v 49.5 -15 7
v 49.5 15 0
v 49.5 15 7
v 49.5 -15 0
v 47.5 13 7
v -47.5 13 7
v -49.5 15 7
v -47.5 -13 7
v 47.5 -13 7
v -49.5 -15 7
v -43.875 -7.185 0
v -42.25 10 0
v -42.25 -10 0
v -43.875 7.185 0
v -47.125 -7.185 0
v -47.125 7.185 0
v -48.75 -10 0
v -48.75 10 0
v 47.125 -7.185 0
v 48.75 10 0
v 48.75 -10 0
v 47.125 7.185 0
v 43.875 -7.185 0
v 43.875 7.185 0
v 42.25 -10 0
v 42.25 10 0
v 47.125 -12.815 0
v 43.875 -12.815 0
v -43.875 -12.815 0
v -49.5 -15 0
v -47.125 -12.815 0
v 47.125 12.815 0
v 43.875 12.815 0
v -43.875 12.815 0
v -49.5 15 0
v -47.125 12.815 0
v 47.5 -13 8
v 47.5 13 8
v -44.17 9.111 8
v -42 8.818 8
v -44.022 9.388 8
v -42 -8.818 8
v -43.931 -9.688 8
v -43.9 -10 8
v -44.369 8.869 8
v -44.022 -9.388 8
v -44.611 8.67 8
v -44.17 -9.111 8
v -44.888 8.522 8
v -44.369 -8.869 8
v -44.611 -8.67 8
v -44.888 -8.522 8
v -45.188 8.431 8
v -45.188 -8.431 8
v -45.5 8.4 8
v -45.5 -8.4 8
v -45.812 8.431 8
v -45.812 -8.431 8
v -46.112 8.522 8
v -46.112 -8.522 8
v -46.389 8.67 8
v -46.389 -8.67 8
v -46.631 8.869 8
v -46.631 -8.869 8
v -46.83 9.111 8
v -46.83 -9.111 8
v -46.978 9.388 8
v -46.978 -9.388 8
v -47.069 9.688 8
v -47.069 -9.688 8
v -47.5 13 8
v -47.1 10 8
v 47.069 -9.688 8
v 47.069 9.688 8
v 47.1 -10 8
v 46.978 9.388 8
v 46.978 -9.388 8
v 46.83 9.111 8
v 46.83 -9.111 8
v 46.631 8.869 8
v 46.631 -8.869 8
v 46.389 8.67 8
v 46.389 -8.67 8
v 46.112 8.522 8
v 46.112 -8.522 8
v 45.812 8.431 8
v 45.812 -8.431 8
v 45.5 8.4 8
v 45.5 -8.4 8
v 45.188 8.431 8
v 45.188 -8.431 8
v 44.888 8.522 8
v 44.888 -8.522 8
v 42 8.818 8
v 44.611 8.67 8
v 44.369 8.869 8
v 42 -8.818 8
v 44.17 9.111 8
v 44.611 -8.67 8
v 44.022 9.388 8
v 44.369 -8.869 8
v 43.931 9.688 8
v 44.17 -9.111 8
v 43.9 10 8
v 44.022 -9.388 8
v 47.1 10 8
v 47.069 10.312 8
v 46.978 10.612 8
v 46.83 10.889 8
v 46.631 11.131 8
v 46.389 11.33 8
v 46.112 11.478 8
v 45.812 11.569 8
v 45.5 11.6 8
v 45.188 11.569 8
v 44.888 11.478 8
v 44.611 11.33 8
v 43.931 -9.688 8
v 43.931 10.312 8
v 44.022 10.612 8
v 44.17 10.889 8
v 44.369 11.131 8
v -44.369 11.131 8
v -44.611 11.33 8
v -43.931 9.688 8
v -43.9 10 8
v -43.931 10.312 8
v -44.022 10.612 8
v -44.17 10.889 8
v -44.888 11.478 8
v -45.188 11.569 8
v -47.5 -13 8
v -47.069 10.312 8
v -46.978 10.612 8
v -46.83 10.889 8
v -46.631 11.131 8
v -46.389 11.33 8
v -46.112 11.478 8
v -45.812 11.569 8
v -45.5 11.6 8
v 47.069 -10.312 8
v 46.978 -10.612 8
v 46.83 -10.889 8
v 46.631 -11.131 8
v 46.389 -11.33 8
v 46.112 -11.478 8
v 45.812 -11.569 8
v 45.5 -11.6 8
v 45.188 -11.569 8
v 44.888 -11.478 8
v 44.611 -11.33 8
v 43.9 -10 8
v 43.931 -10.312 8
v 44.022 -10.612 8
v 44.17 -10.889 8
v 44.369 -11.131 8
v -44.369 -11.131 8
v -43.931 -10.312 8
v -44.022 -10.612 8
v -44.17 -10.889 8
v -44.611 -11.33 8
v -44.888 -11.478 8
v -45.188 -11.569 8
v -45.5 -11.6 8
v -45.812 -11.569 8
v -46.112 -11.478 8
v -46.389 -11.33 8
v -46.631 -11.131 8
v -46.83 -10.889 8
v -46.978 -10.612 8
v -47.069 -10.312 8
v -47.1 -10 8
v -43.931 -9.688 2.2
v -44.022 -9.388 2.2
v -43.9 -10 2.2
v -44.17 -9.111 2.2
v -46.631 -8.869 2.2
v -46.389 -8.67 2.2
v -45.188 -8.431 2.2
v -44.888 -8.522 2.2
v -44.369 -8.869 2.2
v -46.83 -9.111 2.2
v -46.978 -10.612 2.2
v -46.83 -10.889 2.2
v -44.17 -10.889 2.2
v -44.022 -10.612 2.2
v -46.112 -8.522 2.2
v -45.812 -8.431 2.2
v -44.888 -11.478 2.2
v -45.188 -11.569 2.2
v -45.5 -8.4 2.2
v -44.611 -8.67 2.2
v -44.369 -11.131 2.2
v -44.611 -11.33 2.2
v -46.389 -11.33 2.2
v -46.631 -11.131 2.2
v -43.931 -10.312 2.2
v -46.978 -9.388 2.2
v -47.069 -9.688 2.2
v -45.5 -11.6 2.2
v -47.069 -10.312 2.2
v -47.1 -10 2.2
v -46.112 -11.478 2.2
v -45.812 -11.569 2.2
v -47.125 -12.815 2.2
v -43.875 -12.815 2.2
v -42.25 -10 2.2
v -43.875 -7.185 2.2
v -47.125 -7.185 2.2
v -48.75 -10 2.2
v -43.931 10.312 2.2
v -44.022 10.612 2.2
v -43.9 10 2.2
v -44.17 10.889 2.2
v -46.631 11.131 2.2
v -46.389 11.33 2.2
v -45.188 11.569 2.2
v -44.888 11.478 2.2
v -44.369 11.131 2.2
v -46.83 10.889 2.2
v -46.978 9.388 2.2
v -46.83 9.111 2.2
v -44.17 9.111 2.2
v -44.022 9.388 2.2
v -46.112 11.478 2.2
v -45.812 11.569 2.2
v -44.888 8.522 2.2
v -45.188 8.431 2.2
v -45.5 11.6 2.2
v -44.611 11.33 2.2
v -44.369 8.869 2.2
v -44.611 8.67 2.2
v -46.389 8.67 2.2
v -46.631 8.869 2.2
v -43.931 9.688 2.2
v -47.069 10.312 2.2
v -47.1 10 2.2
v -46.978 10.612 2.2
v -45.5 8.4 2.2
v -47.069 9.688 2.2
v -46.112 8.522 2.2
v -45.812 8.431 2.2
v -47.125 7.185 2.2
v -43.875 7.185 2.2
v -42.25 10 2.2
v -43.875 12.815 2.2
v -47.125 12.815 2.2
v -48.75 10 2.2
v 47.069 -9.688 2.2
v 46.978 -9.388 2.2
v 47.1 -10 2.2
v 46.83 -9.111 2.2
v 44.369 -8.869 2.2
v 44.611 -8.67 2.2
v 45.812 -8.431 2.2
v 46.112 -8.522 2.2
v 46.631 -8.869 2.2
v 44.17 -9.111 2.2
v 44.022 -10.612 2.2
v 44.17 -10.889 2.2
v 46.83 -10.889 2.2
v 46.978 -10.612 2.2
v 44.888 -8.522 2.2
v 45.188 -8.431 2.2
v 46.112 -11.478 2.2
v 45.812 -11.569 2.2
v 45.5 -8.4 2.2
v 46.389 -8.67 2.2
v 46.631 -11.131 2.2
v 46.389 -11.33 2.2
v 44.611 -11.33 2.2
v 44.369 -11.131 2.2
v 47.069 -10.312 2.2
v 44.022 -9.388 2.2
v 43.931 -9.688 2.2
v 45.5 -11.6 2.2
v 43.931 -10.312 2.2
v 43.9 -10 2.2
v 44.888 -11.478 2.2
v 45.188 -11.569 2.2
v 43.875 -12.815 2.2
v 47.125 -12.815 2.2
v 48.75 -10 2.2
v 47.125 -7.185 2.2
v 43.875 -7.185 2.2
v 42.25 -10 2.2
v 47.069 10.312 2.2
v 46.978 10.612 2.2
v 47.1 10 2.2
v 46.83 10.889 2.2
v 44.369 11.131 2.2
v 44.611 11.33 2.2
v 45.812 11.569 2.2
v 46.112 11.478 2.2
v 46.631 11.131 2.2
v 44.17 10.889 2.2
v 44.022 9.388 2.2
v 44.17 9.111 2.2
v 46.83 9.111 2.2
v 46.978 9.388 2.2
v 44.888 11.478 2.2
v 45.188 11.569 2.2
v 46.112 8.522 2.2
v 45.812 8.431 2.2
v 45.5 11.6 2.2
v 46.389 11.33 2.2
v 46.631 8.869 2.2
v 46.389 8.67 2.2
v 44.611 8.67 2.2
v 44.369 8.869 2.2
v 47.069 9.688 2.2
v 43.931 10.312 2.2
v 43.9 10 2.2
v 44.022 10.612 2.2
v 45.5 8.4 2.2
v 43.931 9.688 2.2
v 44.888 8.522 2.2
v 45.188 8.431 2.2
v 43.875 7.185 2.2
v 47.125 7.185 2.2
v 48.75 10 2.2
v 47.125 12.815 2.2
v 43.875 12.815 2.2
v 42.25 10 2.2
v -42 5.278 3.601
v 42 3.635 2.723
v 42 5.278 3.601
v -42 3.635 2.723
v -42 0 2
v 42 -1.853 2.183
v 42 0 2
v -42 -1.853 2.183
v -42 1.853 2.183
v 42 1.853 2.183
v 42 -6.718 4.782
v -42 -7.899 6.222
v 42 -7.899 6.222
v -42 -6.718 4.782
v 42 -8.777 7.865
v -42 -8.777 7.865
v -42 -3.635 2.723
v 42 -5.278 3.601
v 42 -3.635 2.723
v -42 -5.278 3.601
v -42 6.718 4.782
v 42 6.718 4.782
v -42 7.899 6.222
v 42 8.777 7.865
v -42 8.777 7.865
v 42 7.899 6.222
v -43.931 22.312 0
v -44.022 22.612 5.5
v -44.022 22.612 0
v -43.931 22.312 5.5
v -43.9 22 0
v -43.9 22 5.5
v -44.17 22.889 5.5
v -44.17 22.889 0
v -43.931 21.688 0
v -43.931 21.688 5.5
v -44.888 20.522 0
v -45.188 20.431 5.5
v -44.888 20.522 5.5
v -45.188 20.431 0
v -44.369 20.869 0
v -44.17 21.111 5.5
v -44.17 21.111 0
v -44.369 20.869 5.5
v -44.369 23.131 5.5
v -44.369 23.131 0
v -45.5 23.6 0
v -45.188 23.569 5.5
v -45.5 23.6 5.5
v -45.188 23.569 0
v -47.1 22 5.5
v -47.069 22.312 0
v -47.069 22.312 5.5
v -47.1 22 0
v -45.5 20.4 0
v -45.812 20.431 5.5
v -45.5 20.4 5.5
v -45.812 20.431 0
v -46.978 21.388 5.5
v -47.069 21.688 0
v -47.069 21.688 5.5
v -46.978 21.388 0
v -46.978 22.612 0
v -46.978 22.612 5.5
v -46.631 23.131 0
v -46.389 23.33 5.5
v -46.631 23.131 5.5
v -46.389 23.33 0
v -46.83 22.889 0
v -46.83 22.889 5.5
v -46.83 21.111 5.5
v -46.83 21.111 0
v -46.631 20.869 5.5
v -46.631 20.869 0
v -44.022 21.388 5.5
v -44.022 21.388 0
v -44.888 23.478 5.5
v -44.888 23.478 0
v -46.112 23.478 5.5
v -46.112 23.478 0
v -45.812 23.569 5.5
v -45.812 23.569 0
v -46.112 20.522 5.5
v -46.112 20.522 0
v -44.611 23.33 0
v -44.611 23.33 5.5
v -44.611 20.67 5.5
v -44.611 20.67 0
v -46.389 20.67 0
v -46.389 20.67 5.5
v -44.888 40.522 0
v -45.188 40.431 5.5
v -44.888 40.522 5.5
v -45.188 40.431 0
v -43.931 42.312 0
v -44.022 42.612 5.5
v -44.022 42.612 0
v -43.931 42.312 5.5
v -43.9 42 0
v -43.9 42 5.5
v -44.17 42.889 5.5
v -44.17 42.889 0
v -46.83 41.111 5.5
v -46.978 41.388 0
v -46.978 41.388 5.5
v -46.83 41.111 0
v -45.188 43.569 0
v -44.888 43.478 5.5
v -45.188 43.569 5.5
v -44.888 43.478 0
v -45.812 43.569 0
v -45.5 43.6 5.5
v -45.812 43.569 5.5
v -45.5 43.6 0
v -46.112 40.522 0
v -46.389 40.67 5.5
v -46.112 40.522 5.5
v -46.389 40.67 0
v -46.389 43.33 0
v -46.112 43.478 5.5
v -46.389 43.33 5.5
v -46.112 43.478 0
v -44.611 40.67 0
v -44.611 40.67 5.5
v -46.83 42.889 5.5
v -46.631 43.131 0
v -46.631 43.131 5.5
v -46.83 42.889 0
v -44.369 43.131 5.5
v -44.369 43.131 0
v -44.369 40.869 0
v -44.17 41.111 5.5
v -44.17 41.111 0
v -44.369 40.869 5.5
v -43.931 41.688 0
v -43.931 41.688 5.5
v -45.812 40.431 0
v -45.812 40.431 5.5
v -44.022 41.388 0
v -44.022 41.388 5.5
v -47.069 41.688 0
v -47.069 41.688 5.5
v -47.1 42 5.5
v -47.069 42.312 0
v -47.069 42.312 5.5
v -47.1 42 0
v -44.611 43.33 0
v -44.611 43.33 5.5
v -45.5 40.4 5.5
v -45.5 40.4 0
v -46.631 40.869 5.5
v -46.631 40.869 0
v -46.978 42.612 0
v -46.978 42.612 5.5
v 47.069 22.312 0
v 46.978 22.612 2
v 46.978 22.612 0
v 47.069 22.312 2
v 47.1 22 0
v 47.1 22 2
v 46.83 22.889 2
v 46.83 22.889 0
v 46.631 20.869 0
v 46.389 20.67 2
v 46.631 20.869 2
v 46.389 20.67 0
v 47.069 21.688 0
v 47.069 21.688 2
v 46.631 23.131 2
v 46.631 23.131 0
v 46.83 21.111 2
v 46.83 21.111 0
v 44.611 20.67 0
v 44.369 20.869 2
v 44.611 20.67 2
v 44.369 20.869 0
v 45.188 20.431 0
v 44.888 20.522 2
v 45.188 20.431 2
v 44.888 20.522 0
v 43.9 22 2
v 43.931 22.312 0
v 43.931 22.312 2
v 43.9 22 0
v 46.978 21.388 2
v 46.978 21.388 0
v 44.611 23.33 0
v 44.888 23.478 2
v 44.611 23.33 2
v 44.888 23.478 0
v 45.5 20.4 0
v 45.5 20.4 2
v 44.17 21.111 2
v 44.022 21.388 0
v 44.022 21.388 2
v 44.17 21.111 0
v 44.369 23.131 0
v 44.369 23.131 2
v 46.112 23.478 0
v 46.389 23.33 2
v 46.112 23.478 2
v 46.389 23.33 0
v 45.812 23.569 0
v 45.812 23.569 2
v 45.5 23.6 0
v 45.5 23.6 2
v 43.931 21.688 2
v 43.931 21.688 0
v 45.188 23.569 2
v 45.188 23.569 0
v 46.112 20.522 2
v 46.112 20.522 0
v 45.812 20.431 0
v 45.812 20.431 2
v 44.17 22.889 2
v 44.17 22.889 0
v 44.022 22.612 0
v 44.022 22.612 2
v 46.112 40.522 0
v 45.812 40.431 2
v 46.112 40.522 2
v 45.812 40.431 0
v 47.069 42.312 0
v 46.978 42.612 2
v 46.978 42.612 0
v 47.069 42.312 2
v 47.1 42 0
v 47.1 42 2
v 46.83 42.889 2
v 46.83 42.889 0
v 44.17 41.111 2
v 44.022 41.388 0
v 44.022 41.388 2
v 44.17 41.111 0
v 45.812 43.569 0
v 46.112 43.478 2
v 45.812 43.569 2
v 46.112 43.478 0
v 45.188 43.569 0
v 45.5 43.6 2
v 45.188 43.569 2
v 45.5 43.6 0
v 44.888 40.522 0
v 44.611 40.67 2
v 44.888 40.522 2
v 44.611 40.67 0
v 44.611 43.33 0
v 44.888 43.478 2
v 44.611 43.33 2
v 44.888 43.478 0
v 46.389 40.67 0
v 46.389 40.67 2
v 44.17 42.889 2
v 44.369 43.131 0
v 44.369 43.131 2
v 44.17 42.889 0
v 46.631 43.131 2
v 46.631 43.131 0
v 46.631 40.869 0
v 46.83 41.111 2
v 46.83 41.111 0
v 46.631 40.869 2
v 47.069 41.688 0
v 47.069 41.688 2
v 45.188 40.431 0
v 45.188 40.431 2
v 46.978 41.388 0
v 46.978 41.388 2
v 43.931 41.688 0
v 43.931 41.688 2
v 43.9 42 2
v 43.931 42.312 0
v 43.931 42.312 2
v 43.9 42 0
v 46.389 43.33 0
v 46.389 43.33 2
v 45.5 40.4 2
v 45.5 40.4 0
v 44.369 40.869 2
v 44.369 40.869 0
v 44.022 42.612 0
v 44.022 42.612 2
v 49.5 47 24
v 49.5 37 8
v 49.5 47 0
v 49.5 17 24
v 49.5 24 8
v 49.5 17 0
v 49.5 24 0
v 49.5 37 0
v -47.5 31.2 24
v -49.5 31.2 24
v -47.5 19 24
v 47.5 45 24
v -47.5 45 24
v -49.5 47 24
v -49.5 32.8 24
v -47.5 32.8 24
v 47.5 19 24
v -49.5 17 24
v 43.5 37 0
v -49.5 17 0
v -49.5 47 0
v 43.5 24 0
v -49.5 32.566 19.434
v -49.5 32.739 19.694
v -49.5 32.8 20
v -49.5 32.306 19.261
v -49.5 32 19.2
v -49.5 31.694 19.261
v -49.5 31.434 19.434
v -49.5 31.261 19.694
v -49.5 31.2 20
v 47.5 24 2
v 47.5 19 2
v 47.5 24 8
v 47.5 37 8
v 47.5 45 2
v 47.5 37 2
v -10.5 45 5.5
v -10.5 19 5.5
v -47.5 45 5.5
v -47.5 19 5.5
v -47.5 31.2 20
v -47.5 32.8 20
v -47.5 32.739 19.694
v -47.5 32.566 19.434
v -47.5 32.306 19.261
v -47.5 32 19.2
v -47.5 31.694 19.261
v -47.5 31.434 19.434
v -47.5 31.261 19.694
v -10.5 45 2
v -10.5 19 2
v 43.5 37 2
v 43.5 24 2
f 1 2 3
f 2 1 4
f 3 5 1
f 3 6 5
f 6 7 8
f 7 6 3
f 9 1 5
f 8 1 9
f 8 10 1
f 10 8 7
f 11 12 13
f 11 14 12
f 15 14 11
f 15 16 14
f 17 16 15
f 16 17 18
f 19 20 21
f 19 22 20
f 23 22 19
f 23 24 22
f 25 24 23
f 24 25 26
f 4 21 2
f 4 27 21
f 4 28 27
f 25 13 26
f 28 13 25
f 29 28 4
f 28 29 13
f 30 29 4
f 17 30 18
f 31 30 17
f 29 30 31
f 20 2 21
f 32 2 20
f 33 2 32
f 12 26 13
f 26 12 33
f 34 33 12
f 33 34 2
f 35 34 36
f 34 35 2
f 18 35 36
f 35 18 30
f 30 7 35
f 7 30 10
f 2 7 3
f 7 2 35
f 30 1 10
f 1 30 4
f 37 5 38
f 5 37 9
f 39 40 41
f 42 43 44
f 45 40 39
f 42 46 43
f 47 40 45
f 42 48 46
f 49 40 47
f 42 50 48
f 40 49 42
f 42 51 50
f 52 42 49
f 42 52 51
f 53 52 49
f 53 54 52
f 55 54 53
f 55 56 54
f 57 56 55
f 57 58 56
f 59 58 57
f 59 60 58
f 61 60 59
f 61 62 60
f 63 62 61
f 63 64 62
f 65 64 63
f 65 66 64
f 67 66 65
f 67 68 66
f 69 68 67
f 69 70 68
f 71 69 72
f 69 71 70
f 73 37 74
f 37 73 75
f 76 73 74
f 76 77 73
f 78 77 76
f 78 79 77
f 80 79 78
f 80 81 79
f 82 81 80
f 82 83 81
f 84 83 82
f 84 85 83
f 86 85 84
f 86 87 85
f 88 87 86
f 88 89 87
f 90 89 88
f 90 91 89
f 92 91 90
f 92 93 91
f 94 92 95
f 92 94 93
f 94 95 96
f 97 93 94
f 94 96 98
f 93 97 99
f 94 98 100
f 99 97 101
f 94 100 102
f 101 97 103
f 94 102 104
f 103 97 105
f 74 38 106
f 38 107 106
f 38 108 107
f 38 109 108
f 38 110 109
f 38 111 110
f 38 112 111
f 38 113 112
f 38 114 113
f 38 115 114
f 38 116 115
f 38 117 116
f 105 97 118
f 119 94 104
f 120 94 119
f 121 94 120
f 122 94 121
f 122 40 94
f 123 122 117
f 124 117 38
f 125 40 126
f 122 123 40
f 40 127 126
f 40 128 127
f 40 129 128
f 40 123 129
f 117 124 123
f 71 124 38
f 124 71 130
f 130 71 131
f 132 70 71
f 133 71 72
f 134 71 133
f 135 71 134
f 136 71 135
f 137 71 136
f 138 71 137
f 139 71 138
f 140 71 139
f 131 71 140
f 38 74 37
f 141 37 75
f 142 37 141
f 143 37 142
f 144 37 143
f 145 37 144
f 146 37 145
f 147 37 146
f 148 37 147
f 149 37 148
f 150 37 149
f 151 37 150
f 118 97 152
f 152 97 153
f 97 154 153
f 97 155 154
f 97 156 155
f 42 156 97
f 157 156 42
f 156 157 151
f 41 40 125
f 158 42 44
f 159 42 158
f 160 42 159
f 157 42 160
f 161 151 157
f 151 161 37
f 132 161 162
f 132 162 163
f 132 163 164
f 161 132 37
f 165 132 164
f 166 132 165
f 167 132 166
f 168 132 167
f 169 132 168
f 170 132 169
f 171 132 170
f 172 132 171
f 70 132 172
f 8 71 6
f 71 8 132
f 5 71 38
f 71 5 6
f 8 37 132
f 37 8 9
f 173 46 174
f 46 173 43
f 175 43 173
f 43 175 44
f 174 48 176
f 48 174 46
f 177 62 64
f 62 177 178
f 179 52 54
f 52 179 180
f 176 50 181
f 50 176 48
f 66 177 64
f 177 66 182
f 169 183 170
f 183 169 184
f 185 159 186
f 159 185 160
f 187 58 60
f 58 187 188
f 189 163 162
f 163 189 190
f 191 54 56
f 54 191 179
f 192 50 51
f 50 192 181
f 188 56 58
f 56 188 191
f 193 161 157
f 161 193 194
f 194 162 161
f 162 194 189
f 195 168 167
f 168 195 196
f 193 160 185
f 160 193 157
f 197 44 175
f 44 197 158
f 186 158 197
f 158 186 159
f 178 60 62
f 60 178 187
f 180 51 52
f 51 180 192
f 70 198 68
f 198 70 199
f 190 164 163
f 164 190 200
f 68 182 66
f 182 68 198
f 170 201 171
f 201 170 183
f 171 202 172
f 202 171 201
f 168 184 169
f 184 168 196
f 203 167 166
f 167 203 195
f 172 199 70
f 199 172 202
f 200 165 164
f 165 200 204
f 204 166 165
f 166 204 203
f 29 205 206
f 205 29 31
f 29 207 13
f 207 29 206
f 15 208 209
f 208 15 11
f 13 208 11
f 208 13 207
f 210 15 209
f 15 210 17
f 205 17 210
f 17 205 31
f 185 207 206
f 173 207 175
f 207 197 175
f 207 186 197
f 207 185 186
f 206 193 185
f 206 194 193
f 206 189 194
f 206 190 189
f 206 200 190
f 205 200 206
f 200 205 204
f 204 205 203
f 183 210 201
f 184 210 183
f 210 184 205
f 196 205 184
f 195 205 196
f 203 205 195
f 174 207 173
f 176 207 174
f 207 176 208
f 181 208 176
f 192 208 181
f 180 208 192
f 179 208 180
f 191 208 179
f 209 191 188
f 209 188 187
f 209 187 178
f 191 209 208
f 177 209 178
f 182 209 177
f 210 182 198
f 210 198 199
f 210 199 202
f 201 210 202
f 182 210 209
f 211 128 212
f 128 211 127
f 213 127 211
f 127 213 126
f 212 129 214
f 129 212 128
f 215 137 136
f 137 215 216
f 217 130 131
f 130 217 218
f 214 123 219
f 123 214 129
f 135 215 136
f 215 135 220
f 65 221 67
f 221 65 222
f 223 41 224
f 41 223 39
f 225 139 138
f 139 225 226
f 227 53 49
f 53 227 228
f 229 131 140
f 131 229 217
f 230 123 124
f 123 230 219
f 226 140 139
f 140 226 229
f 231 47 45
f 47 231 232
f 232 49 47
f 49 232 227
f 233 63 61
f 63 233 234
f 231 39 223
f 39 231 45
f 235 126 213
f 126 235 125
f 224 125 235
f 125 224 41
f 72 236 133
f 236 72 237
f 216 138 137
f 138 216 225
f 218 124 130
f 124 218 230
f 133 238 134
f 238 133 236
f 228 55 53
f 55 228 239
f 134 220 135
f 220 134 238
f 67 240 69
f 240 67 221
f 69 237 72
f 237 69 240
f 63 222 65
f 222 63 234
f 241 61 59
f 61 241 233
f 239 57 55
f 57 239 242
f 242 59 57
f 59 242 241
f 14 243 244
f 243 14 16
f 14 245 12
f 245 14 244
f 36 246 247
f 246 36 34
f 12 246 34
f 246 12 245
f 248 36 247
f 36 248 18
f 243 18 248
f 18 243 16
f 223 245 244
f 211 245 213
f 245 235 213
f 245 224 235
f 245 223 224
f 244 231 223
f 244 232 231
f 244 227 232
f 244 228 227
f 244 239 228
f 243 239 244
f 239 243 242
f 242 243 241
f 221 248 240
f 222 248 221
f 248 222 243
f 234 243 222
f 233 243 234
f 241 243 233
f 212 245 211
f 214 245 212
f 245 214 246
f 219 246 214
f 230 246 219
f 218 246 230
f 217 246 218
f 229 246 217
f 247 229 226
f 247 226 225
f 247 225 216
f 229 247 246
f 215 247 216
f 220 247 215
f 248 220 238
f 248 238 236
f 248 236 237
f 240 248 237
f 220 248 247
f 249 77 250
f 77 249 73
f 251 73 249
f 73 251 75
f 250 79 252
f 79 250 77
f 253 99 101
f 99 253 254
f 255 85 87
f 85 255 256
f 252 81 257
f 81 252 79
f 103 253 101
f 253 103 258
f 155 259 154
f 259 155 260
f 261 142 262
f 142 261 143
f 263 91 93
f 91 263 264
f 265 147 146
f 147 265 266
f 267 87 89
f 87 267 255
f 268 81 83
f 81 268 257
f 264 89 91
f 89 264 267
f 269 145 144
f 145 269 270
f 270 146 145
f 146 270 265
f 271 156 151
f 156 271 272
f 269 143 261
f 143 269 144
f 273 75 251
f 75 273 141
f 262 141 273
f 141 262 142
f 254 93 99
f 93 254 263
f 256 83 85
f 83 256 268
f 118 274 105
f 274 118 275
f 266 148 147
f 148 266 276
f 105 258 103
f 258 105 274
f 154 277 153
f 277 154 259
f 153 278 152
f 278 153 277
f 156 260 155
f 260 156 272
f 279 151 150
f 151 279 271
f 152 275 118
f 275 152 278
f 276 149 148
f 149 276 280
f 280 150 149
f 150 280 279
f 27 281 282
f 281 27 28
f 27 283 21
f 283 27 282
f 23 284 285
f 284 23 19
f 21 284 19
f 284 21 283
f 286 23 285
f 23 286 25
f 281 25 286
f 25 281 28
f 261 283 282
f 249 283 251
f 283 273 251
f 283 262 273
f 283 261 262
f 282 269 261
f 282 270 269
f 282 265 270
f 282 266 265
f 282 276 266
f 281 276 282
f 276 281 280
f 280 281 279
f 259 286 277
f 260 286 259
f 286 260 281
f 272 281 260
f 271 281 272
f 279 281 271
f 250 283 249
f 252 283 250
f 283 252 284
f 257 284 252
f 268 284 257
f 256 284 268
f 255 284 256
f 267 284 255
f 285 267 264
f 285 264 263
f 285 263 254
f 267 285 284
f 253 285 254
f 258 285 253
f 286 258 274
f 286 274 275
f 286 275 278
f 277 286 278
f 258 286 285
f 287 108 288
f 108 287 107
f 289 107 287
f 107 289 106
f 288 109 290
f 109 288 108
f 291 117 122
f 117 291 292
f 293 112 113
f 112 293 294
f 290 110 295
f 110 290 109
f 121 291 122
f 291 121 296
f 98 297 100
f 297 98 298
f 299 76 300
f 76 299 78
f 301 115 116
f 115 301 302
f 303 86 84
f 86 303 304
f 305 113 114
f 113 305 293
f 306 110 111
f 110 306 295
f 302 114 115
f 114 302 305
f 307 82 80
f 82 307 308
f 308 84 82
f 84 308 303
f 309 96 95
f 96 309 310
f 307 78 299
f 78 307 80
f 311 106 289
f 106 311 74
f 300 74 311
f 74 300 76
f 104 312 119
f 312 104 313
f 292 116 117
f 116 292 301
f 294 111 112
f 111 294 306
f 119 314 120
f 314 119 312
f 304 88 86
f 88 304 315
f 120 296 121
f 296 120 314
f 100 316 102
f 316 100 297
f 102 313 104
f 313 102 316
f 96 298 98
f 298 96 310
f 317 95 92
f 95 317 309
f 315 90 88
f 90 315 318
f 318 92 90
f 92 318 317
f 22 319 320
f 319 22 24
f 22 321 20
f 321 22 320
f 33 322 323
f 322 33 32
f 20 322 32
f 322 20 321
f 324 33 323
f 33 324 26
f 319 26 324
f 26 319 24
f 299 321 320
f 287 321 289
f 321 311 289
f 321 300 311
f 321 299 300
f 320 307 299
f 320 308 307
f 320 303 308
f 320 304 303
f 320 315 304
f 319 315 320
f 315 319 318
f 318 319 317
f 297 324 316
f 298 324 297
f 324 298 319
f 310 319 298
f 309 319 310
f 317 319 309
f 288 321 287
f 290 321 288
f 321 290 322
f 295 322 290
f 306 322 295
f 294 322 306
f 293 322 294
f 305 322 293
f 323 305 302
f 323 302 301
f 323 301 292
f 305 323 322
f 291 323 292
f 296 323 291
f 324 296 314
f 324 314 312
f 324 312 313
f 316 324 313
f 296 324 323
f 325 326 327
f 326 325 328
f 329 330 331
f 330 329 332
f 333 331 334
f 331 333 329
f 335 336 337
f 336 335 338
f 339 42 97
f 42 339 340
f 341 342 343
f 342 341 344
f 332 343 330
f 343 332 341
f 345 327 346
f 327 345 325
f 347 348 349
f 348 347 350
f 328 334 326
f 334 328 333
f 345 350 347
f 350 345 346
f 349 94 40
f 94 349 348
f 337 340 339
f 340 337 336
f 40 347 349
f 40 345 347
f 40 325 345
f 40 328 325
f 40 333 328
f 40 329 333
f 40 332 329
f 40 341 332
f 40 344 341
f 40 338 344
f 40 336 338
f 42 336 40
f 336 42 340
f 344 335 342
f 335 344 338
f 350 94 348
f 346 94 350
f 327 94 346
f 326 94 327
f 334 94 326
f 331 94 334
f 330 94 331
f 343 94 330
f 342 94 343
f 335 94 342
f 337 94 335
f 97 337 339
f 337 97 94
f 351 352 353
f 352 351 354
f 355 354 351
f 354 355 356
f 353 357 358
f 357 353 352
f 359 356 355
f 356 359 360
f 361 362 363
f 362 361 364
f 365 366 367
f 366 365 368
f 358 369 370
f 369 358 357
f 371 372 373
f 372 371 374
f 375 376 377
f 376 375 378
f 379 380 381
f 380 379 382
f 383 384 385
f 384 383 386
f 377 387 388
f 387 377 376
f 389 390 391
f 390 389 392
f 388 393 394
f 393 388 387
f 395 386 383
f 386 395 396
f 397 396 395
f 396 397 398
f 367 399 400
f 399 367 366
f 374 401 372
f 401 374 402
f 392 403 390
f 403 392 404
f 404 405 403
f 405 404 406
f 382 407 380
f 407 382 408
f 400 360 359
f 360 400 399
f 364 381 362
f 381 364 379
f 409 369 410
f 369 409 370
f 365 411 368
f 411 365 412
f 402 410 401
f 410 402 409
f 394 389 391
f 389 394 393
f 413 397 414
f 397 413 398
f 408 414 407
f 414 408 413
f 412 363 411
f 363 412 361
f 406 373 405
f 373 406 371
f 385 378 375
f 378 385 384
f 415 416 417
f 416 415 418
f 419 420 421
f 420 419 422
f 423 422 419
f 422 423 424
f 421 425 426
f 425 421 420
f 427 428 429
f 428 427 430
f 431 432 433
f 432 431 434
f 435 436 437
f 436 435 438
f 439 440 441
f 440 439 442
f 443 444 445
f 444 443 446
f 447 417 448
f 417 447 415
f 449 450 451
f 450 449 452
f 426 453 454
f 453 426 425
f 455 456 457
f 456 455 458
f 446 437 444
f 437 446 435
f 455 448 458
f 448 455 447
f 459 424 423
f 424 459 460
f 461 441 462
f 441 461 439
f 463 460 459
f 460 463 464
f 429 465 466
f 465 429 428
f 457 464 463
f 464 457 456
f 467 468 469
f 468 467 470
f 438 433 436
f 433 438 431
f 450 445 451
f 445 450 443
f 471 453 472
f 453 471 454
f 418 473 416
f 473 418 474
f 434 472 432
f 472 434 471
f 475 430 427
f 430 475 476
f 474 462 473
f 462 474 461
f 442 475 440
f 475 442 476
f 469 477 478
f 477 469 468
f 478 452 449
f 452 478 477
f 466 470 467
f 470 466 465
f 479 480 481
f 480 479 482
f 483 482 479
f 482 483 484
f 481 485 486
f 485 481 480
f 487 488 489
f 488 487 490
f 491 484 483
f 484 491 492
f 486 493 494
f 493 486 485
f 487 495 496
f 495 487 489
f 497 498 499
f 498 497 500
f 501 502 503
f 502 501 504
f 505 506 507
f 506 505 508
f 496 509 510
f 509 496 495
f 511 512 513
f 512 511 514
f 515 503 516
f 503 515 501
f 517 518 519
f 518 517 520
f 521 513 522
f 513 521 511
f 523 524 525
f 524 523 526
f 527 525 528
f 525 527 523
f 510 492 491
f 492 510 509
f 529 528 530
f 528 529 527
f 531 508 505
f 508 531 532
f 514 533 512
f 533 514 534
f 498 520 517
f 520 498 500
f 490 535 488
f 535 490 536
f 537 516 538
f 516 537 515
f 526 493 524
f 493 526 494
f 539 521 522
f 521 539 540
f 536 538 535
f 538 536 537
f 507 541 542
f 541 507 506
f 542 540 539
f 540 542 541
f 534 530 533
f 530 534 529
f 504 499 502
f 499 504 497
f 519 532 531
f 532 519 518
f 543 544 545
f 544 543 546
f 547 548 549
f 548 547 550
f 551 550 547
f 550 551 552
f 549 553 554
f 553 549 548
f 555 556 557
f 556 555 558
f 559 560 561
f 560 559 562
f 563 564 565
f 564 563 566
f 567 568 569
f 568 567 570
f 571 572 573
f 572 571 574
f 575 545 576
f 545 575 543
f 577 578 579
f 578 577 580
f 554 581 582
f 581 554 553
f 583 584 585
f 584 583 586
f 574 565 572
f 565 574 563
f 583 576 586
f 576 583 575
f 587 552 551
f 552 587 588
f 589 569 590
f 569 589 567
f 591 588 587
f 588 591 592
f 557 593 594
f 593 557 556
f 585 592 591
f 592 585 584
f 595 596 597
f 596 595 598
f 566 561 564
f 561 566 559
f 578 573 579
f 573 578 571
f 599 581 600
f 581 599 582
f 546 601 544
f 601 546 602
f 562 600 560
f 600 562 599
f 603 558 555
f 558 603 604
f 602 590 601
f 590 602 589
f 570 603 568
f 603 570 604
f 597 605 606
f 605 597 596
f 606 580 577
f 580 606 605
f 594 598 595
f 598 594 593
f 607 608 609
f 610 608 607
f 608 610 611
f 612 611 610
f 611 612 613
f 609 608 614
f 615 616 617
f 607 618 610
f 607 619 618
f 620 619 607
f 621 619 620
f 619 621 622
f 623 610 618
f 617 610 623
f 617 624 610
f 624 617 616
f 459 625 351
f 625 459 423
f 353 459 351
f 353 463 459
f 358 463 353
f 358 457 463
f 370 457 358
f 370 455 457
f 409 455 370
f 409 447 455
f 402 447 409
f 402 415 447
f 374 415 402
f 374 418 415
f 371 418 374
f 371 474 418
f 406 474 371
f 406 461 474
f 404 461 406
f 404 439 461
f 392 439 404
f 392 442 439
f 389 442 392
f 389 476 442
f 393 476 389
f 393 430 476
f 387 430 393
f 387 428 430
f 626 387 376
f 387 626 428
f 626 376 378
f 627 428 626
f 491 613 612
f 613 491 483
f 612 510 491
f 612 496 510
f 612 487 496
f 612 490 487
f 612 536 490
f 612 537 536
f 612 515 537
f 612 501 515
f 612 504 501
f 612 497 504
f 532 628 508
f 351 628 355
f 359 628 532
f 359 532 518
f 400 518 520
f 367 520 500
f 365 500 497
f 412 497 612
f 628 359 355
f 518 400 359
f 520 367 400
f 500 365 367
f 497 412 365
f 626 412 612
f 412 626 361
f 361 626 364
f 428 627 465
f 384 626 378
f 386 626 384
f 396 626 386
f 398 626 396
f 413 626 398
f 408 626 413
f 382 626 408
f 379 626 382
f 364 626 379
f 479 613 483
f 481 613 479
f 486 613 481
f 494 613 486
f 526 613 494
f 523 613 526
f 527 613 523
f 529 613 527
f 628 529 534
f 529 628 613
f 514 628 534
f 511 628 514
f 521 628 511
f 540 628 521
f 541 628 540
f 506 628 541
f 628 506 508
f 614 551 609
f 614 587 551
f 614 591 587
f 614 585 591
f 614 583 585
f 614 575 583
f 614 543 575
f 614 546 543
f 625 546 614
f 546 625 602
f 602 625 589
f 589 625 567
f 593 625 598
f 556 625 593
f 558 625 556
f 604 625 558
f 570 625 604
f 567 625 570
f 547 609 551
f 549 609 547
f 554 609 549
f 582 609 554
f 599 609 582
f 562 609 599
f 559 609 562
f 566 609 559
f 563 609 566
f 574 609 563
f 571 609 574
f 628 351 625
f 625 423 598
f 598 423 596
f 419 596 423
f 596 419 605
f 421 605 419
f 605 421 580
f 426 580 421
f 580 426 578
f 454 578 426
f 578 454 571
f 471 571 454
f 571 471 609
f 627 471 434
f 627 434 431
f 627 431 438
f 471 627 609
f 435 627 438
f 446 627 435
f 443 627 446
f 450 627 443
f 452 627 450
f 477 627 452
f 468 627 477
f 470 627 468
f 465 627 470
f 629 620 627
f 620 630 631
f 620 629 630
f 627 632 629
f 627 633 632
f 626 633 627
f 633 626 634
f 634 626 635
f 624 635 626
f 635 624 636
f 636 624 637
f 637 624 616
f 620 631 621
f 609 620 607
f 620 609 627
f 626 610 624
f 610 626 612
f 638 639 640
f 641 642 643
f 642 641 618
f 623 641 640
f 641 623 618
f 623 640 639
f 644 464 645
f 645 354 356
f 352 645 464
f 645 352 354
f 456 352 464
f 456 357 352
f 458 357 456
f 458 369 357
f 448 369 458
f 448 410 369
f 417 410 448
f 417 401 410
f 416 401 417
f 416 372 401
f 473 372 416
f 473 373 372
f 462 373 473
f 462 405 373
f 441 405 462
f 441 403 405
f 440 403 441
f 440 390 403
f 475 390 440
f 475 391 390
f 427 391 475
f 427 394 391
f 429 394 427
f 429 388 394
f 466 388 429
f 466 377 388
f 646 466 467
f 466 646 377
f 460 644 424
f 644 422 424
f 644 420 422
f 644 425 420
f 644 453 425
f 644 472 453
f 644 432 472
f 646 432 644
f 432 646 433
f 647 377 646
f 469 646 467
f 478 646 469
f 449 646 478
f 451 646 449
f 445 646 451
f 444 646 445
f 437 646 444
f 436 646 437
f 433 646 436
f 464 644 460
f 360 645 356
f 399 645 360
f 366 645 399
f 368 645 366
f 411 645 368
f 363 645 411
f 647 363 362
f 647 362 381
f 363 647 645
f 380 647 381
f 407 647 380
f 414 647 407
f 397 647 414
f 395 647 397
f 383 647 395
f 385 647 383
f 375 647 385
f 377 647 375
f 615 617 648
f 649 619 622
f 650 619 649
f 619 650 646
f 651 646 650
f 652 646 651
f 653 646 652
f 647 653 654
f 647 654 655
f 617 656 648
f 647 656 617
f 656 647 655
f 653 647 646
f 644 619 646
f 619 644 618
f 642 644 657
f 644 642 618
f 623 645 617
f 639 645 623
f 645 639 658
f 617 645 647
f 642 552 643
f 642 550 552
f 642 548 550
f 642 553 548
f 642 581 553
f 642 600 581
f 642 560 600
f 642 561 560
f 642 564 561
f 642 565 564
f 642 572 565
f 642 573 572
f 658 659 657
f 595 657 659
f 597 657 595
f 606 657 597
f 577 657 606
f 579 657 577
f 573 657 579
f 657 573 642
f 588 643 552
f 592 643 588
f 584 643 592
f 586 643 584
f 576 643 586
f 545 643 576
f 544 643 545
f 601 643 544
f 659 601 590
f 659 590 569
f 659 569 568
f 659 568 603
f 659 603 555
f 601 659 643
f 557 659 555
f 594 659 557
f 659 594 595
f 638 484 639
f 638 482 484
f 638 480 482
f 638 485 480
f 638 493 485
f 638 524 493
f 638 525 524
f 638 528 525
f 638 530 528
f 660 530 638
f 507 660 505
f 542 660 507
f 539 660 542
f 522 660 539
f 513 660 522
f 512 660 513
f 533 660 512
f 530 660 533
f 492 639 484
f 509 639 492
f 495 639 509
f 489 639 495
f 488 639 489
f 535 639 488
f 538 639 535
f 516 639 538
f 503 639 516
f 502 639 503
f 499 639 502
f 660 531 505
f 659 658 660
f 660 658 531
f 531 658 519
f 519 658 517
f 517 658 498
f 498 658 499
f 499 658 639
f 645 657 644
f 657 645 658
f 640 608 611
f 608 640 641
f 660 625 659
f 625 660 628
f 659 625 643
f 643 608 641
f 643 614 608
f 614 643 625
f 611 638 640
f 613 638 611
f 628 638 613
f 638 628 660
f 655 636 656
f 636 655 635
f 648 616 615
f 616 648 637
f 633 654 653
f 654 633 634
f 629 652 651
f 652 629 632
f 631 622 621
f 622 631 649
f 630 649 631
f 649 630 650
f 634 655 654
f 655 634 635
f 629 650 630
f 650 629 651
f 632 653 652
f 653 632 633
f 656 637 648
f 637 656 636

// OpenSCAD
module sensorCase_lower() {
    difference() {
        union() {
            translate([0, 0, 7/2]) cube([87+8+4, 26+4, 7], center=true);
            translate([0, 0, 8/2]) cube([87+8, 26, 8], center=true);
        }
        translate([-42, 0, 19/2+2]) rotate([0, 90, 0]) cylinder(d=19, h=84, $fn=32);
        for(i=[-1, 1]) for(j=[-1, 1]) {
            translate([i*(87/2+2), j*10, -1]) {
                cylinder(d=3.2, h=50, $fn=32);
                cylinder(d=6.5, h=3.2, $fn=6);
            }
        }
    }
}

module sensorCase_upper() {
    difference() {
        translate([0, 0, (27+2-5)/2]) cube([87+8+4, 26+4, 27+2-5], center=true);
        translate([-87/2-4, -26/2, 2+3.5]) cube([87+8, 26, 27+2-5]);
        translate([-58/2+(87+8-58)/2, -26/2, 2]) cube([58, 26, 27+2-5]);
        for(i=[-1, 1]) for(j=[-1, 1]) {
            translate([i*(87/2+2), j*10, -1]) cylinder(d=3.2, h=50, $fn=32);
        }
        translate([87/2, -8, -0.5]) cube([10, 13, 8.5]);
        hull() {
            for(i=[0, 1]) translate([-87/2-3, 0, 20+i*10]) rotate([0, -90, 0]) cylinder(d=1.6, h=10, $fn=16);
        }
    }
}

sensorCase_lower();
//color("blue") translate([0, 0, 24]) rotate([180, 0, 0]) sensorCase_upper();
translate([0, 32, 0]) sensorCase_upper();
